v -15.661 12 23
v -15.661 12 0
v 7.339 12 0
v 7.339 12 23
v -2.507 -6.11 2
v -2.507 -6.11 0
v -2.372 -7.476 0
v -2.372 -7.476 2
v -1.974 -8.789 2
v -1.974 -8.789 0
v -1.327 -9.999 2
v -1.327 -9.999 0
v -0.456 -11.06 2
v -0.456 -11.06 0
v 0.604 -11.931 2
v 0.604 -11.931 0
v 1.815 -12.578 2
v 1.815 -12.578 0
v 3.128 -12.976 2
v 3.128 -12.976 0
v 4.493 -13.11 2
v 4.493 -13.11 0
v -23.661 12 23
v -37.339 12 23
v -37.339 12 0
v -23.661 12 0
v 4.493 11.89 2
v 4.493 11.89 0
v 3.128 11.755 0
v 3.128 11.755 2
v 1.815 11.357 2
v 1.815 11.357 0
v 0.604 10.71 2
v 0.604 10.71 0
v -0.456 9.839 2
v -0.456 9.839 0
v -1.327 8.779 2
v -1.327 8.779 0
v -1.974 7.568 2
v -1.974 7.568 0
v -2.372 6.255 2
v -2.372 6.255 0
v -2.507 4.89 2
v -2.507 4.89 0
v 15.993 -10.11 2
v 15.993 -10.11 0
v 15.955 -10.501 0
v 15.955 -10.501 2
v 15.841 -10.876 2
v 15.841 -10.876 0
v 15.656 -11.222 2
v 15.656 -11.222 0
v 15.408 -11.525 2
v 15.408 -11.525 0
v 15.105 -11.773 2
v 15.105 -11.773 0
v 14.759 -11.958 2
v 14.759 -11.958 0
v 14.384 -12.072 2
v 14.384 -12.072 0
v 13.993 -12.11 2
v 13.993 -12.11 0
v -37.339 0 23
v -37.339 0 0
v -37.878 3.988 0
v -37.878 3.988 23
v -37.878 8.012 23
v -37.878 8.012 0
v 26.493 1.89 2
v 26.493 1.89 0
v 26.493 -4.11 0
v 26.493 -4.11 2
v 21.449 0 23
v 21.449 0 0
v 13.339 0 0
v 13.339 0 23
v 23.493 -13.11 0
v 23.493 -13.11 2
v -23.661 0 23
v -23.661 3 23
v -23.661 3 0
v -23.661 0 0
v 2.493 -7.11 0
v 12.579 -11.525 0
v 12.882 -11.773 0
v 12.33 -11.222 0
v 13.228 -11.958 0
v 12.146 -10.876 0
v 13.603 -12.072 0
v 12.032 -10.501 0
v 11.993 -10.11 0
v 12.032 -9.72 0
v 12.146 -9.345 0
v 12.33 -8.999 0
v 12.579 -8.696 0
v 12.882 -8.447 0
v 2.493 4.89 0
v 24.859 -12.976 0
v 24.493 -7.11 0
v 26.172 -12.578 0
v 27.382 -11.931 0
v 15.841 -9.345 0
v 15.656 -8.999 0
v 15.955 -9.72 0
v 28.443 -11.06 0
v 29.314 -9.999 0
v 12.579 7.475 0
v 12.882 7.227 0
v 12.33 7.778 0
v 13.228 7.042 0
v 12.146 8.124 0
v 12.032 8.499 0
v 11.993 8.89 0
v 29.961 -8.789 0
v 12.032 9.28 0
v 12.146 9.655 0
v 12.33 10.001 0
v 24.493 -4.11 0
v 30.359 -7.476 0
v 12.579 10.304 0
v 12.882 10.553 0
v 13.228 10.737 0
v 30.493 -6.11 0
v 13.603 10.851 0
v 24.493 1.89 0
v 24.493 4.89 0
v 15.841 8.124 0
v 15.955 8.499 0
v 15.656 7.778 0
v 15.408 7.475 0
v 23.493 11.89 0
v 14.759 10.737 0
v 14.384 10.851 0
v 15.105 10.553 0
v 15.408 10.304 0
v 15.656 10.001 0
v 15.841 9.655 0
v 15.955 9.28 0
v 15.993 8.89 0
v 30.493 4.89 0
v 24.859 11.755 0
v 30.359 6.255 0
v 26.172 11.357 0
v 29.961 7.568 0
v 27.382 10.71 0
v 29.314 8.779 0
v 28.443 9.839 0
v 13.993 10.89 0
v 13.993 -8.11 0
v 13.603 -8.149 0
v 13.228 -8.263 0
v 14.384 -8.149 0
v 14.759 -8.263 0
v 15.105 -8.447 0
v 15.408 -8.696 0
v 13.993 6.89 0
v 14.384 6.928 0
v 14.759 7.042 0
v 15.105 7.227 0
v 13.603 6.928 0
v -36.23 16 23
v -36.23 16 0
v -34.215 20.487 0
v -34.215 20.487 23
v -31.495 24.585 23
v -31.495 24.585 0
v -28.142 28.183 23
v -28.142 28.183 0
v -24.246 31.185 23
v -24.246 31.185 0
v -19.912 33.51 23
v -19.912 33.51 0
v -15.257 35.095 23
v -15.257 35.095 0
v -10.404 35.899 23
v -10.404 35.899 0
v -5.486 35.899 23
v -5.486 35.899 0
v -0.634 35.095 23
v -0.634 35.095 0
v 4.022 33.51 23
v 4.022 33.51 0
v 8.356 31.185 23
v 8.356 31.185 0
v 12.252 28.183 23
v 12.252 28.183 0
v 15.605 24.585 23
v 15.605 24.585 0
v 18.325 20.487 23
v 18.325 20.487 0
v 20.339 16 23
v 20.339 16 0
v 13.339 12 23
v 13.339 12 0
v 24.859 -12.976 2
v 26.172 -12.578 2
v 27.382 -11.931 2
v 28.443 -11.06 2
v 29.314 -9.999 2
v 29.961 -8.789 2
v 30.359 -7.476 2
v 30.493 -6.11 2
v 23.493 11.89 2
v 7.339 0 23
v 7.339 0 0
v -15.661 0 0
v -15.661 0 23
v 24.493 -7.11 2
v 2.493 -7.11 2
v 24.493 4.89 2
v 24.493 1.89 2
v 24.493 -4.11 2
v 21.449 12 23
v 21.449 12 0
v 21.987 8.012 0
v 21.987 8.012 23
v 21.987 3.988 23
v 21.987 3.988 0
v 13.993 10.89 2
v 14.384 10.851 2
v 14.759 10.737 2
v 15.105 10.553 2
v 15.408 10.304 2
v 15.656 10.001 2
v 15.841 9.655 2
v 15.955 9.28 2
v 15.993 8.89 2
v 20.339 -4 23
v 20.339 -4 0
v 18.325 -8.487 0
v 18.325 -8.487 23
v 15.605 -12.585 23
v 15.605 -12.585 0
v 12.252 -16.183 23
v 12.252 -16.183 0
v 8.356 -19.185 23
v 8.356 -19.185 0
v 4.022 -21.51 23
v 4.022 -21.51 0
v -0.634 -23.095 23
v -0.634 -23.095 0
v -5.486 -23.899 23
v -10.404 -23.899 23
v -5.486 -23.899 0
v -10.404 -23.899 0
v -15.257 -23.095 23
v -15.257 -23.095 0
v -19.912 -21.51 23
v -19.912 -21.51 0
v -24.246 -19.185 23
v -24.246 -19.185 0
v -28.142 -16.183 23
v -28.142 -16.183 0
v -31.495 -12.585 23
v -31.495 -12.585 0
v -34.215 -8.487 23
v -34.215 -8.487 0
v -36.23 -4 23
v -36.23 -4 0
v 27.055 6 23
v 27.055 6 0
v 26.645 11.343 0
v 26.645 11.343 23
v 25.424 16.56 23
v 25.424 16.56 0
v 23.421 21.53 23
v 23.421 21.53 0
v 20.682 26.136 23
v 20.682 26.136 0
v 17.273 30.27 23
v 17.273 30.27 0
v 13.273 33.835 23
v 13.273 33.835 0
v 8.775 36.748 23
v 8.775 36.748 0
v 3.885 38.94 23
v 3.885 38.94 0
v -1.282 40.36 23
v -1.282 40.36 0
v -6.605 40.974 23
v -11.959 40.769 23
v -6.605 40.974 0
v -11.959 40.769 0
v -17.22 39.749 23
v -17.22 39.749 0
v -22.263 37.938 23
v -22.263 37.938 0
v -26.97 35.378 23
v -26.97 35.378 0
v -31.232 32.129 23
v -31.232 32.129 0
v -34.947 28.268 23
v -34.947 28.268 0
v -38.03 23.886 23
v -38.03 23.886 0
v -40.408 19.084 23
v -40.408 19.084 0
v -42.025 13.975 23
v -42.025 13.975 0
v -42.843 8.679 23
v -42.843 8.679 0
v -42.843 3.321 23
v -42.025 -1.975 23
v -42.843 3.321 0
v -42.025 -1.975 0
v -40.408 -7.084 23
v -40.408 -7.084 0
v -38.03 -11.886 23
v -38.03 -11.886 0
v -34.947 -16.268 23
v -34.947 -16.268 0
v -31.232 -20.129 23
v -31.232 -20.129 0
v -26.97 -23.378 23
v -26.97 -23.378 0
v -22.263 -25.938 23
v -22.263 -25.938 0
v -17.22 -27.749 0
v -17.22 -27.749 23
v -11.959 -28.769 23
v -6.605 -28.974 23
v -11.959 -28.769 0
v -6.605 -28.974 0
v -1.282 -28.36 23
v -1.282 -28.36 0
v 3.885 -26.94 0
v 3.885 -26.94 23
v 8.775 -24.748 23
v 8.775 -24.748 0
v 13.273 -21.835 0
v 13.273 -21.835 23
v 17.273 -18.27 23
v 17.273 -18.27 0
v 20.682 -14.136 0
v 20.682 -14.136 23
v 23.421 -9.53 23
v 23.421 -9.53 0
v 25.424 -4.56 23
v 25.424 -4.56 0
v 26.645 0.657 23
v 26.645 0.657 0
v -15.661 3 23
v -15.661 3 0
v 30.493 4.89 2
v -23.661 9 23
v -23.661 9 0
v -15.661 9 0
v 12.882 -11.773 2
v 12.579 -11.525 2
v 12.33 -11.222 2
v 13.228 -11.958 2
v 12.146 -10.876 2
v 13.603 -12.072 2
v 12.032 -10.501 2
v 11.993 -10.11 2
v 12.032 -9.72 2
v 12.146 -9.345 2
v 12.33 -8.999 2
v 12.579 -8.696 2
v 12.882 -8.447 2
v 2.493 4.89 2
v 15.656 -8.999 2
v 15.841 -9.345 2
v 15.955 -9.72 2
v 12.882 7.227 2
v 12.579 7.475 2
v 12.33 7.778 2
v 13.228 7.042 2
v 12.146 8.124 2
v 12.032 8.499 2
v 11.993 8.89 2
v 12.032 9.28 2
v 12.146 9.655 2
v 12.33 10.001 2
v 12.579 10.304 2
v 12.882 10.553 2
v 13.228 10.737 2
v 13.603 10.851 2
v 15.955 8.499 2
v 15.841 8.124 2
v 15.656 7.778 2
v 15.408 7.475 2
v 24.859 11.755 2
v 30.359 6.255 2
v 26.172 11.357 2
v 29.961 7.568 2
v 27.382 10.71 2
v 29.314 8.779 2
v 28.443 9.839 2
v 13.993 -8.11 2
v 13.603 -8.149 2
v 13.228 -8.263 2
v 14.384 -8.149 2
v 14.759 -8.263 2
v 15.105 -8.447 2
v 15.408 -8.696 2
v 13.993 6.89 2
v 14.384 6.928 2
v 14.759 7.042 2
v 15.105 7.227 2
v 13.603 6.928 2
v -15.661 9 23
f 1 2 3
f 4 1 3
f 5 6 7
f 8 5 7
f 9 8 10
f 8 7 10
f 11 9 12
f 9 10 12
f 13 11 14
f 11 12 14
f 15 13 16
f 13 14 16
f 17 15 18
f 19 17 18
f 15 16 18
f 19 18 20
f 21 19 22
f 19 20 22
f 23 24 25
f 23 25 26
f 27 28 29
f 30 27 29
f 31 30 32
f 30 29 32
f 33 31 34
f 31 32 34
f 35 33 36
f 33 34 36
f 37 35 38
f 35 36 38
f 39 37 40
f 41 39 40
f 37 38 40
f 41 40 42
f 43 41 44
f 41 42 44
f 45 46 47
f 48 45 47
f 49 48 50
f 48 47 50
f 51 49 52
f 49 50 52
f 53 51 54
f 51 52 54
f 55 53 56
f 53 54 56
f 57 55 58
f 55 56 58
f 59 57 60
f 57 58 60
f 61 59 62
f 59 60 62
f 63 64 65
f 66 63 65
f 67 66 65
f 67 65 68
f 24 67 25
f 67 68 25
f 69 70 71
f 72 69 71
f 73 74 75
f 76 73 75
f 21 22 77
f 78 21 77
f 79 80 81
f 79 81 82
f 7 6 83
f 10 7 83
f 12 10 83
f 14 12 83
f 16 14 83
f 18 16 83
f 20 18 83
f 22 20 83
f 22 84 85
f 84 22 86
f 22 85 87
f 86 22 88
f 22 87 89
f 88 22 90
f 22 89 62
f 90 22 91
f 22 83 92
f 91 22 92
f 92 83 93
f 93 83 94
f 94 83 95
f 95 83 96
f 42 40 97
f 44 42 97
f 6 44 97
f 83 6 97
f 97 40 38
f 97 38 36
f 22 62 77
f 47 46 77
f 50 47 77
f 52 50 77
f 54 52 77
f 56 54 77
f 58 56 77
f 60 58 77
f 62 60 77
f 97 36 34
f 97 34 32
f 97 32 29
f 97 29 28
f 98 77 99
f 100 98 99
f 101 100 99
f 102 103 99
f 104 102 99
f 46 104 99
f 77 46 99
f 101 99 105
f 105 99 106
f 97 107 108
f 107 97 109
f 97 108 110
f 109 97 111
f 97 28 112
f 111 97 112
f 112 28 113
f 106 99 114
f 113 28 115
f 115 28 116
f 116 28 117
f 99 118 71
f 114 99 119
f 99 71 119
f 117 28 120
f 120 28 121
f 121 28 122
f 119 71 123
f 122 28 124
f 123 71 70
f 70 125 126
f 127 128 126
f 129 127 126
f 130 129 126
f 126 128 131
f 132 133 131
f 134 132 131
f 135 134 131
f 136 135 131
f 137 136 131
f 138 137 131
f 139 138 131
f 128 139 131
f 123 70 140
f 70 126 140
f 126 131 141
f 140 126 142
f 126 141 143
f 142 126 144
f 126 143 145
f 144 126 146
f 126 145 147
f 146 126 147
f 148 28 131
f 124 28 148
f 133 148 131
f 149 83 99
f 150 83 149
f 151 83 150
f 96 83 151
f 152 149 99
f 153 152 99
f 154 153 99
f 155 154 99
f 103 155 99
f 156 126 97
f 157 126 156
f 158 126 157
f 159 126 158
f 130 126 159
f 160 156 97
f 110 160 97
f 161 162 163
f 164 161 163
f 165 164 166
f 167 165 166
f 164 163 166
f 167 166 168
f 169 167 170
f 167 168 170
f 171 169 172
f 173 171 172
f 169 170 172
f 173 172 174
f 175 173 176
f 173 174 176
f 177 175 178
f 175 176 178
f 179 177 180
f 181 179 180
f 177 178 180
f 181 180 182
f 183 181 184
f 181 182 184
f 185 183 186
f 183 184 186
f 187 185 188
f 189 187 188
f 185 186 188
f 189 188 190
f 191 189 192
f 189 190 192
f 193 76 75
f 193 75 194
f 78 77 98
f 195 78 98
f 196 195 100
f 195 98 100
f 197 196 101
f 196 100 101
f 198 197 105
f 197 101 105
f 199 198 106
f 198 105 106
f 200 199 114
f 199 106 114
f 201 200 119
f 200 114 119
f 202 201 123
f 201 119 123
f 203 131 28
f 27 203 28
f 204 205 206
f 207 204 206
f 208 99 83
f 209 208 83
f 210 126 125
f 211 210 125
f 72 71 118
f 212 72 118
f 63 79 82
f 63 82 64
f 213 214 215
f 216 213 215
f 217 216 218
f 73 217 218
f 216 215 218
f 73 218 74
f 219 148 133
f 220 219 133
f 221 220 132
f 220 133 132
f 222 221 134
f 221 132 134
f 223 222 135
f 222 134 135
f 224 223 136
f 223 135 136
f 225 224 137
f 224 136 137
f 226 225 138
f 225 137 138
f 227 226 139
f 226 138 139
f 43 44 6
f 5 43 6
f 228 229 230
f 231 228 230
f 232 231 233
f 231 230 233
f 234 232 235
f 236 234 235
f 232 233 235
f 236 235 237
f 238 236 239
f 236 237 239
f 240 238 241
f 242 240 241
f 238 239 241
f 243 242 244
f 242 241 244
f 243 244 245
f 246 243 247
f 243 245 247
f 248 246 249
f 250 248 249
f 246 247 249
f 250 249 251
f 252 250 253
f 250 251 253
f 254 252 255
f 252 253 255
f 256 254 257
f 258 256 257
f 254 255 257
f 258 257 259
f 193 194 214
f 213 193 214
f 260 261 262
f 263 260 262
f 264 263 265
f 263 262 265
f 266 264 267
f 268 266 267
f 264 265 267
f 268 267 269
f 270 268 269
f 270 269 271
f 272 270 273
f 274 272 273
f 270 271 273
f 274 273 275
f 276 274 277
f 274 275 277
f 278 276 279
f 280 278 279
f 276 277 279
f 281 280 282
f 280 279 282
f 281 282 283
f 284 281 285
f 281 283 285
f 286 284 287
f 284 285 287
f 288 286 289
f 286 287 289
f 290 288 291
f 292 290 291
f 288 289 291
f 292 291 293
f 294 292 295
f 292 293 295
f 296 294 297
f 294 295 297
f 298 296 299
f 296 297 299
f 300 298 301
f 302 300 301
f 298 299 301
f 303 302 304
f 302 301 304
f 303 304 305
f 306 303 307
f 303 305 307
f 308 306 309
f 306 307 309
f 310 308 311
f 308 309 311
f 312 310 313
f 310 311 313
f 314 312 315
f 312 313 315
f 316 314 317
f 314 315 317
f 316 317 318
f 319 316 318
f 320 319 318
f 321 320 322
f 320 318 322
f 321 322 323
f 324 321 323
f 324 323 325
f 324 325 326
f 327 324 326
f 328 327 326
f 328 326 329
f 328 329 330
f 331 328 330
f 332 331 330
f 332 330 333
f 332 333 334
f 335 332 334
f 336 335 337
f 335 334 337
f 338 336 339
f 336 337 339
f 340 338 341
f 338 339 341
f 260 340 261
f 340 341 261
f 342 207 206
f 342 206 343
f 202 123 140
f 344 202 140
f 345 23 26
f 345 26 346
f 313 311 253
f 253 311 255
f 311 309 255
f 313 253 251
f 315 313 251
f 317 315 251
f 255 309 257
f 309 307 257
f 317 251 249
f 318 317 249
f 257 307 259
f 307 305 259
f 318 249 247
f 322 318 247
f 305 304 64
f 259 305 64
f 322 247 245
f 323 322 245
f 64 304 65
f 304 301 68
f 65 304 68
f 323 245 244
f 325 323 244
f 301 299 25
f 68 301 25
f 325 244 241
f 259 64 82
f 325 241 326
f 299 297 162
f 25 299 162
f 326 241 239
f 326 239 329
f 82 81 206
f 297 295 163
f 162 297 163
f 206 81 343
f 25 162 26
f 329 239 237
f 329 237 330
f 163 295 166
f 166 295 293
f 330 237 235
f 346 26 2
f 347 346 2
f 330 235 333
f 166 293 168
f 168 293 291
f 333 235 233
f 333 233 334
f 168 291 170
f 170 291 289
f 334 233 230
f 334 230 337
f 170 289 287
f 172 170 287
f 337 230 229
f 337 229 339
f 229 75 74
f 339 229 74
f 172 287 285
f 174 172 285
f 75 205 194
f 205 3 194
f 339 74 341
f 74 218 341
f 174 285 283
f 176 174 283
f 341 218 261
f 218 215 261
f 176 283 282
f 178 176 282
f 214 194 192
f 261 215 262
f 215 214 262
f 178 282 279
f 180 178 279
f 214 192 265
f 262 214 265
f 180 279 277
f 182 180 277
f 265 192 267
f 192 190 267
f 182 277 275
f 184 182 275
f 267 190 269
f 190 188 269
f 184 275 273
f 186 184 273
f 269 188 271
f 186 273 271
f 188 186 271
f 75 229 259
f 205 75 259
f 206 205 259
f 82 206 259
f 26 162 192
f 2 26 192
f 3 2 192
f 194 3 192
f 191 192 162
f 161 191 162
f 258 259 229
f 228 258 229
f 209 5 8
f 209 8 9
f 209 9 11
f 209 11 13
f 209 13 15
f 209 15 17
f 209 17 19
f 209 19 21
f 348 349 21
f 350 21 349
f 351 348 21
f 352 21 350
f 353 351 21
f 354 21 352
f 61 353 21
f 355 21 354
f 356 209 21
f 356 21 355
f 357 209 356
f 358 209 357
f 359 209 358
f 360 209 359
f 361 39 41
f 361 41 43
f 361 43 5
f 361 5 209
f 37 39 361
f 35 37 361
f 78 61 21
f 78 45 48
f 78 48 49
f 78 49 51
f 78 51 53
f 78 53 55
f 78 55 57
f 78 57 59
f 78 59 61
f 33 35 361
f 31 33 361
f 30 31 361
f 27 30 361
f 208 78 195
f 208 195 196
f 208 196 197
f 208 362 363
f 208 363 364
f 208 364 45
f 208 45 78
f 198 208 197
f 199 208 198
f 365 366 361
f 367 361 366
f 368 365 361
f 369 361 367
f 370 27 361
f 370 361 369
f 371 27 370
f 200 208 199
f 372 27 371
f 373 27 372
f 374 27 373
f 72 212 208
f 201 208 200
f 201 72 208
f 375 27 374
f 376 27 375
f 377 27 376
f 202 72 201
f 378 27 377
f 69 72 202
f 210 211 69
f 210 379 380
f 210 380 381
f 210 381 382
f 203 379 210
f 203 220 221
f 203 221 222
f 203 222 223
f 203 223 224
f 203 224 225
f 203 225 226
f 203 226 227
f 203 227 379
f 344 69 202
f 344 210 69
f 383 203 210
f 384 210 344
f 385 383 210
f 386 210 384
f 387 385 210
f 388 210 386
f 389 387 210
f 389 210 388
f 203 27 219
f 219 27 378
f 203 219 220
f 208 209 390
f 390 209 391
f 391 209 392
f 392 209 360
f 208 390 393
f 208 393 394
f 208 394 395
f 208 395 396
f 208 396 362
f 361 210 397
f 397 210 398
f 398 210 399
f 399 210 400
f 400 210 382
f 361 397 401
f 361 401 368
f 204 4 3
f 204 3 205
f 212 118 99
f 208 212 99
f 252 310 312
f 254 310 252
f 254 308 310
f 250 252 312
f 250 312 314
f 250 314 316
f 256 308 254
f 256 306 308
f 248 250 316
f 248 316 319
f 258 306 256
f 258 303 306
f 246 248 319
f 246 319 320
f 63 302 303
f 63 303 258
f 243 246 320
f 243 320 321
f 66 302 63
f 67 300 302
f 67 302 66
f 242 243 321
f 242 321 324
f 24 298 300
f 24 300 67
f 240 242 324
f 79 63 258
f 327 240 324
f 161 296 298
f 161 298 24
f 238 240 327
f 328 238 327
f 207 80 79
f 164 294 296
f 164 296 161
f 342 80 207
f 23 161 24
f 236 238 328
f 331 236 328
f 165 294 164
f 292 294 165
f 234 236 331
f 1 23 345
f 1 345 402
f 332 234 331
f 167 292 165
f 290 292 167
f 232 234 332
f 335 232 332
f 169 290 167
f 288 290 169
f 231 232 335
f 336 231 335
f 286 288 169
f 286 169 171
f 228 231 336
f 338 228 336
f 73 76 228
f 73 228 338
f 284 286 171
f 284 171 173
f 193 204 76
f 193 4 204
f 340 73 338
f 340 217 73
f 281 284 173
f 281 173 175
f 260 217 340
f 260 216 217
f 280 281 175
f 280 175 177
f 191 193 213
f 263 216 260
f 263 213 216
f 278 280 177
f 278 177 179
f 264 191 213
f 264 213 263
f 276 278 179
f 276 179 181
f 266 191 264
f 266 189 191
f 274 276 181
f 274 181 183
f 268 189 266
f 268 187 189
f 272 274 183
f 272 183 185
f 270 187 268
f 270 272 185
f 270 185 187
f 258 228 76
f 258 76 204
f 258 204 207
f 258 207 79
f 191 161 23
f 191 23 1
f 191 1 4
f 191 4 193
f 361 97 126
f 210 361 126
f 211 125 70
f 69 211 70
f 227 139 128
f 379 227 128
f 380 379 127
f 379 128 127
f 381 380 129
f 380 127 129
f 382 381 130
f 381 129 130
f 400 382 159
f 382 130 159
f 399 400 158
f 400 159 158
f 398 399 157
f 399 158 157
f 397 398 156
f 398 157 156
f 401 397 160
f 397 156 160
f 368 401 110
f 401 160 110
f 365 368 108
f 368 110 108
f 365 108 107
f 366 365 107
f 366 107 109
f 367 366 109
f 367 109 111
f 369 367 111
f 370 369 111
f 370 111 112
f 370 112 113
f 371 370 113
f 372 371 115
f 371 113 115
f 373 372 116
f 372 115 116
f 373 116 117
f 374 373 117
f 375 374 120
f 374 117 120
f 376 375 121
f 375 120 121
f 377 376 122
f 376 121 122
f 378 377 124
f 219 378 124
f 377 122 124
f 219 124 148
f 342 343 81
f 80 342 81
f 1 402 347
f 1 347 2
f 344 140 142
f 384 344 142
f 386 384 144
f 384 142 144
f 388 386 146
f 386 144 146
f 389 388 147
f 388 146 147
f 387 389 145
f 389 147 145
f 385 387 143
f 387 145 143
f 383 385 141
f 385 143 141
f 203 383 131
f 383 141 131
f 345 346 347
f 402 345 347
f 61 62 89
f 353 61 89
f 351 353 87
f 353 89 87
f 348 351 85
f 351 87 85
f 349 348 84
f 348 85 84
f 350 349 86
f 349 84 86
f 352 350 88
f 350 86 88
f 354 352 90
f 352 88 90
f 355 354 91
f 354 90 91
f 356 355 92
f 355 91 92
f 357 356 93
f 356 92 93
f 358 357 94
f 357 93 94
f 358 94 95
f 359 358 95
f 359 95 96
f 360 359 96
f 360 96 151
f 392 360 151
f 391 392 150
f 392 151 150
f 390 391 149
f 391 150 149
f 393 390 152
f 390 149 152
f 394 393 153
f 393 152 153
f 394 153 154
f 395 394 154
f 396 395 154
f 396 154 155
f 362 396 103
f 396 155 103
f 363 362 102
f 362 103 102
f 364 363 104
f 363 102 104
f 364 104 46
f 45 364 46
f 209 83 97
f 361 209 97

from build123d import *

# Parameters (mm, degrees)
F1_DEPTH = 2
F2_R     = 35
F3_DEPTH = 23


with BuildPart() as f1:
    # F0 (on Top) → F1 (new body)
    with BuildSketch(Plane.XY):
        with BuildLine():
            ThreePointArc((15.99342, -10.110435), (12.579206, -8.696222), (13.99342, -12.110435))
            ThreePointArc((13.99342, -12.110435), (15.407633, -11.524649), (15.99342, -10.110435))
        make_face()
        with BuildLine():
            ThreePointArc((15.99342, 8.889565), (15.407633, 10.303778), (13.99342, 10.889565))
            ThreePointArc((13.99342, 10.889565), (12.579206, 7.475351), (15.99342, 8.889565))
        make_face()
        with BuildLine():
            Line((13.99342, 11.889565), (4.49342, 11.889565))
            ThreePointArc((4.49342, 11.889565), (-0.456328, 9.839312), (-2.50658, 4.889565))
            Line((-2.50658, 4.889565), (-2.50658, -6.110435))
            ThreePointArc((-2.50658, -6.110435), (-0.456328, -11.060183), (4.49342, -13.110435))
            Line((4.49342, -13.110435), (13.99342, -13.110435))
            Line((13.99342, -13.110435), (23.49342, -13.110435))
            ThreePointArc((23.49342, -13.110435), (28.443167, -11.060183), (30.49342, -6.110435))
            Line((30.49342, -6.110435), (30.49342, 4.889565))
            ThreePointArc((30.49342, 4.889565), (28.443167, 9.839312), (23.49342, 11.889565))
            Line((23.49342, 11.889565), (13.99342, 11.889565))
        make_face()
        with BuildLine():
            ThreePointArc((15.99342, -10.110435), (15.407633, -11.524649), (13.99342, -12.110435))
            ThreePointArc((13.99342, -12.110435), (12.579206, -8.696222), (15.99342, -10.110435))
        make_face(mode=Mode.SUBTRACT)
        Polygon((2.49342, -7.110435), (2.49342, 4.889565), (24.49342, 4.889565), (24.49342, 1.889565), (26.49342, 1.889565), (26.49342, -4.110435), (24.49342, -4.110435), (24.49342, -7.110435), align=None, mode=Mode.SUBTRACT)
        with BuildLine():
            ThreePointArc((15.99342, 8.889565), (12.579206, 7.475351), (13.99342, 10.889565))
            ThreePointArc((13.99342, 10.889565), (15.407633, 10.303778), (15.99342, 8.889565))
        make_face(mode=Mode.SUBTRACT)
    extrude(amount=F1_DEPTH)


with BuildPart() as f3:
    # F2 (on Top) → F3 (new body)
    with BuildSketch(Plane.XY):
        with Locations((-7.945243, 6)):
            Circle(F2_R)
        with BuildLine():
            ThreePointArc((20.339028, -4), (-7.945243, -24), (-36.229515, -4))
            Line((-36.229515, -4), (20.339028, -4))
        make_face(mode=Mode.SUBTRACT)
        with BuildLine():
            ThreePointArc((-37.33912, 0), (-37.945243, 6), (-37.33912, 12))
            Line((-37.33912, 12), (-23.660972, 12))
            Line((-23.660972, 12), (-23.660972, 9))
            Line((-23.660972, 9), (-15.660972, 9))
            Line((-15.660972, 9), (-15.660972, 12))
            Line((-15.660972, 12), (7.339028, 12))
            Line((7.339028, 12), (7.339028, 0))
            Line((7.339028, 0), (-15.660972, 0))
            Line((-15.660972, 0), (-15.660972, 3))
            Line((-15.660972, 3), (-23.660972, 3))
            Line((-23.660972, 3), (-23.660972, 0))
            Line((-23.660972, 0), (-37.33912, 0))
        make_face(mode=Mode.SUBTRACT)
        with BuildLine():
            Line((21.448634, 0), (20.339028, 0))
            Line((20.339028, 0), (13.339028, 0))
            Line((13.339028, 0), (13.339028, 12))
            Line((13.339028, 12), (20.339028, 12))
            Line((20.339028, 12), (21.448634, 12))
            ThreePointArc((21.448634, 12), (22.054757, 6), (21.448634, 0))
        make_face(mode=Mode.SUBTRACT)
        with BuildLine():
            Line((20.339028, 16), (-36.229515, 16))
            ThreePointArc((-36.229515, 16), (-7.945243, 36), (20.339028, 16))
        make_face(mode=Mode.SUBTRACT)
    extrude(amount=F3_DEPTH)


solid = Compound([f1.part, f3.part])
